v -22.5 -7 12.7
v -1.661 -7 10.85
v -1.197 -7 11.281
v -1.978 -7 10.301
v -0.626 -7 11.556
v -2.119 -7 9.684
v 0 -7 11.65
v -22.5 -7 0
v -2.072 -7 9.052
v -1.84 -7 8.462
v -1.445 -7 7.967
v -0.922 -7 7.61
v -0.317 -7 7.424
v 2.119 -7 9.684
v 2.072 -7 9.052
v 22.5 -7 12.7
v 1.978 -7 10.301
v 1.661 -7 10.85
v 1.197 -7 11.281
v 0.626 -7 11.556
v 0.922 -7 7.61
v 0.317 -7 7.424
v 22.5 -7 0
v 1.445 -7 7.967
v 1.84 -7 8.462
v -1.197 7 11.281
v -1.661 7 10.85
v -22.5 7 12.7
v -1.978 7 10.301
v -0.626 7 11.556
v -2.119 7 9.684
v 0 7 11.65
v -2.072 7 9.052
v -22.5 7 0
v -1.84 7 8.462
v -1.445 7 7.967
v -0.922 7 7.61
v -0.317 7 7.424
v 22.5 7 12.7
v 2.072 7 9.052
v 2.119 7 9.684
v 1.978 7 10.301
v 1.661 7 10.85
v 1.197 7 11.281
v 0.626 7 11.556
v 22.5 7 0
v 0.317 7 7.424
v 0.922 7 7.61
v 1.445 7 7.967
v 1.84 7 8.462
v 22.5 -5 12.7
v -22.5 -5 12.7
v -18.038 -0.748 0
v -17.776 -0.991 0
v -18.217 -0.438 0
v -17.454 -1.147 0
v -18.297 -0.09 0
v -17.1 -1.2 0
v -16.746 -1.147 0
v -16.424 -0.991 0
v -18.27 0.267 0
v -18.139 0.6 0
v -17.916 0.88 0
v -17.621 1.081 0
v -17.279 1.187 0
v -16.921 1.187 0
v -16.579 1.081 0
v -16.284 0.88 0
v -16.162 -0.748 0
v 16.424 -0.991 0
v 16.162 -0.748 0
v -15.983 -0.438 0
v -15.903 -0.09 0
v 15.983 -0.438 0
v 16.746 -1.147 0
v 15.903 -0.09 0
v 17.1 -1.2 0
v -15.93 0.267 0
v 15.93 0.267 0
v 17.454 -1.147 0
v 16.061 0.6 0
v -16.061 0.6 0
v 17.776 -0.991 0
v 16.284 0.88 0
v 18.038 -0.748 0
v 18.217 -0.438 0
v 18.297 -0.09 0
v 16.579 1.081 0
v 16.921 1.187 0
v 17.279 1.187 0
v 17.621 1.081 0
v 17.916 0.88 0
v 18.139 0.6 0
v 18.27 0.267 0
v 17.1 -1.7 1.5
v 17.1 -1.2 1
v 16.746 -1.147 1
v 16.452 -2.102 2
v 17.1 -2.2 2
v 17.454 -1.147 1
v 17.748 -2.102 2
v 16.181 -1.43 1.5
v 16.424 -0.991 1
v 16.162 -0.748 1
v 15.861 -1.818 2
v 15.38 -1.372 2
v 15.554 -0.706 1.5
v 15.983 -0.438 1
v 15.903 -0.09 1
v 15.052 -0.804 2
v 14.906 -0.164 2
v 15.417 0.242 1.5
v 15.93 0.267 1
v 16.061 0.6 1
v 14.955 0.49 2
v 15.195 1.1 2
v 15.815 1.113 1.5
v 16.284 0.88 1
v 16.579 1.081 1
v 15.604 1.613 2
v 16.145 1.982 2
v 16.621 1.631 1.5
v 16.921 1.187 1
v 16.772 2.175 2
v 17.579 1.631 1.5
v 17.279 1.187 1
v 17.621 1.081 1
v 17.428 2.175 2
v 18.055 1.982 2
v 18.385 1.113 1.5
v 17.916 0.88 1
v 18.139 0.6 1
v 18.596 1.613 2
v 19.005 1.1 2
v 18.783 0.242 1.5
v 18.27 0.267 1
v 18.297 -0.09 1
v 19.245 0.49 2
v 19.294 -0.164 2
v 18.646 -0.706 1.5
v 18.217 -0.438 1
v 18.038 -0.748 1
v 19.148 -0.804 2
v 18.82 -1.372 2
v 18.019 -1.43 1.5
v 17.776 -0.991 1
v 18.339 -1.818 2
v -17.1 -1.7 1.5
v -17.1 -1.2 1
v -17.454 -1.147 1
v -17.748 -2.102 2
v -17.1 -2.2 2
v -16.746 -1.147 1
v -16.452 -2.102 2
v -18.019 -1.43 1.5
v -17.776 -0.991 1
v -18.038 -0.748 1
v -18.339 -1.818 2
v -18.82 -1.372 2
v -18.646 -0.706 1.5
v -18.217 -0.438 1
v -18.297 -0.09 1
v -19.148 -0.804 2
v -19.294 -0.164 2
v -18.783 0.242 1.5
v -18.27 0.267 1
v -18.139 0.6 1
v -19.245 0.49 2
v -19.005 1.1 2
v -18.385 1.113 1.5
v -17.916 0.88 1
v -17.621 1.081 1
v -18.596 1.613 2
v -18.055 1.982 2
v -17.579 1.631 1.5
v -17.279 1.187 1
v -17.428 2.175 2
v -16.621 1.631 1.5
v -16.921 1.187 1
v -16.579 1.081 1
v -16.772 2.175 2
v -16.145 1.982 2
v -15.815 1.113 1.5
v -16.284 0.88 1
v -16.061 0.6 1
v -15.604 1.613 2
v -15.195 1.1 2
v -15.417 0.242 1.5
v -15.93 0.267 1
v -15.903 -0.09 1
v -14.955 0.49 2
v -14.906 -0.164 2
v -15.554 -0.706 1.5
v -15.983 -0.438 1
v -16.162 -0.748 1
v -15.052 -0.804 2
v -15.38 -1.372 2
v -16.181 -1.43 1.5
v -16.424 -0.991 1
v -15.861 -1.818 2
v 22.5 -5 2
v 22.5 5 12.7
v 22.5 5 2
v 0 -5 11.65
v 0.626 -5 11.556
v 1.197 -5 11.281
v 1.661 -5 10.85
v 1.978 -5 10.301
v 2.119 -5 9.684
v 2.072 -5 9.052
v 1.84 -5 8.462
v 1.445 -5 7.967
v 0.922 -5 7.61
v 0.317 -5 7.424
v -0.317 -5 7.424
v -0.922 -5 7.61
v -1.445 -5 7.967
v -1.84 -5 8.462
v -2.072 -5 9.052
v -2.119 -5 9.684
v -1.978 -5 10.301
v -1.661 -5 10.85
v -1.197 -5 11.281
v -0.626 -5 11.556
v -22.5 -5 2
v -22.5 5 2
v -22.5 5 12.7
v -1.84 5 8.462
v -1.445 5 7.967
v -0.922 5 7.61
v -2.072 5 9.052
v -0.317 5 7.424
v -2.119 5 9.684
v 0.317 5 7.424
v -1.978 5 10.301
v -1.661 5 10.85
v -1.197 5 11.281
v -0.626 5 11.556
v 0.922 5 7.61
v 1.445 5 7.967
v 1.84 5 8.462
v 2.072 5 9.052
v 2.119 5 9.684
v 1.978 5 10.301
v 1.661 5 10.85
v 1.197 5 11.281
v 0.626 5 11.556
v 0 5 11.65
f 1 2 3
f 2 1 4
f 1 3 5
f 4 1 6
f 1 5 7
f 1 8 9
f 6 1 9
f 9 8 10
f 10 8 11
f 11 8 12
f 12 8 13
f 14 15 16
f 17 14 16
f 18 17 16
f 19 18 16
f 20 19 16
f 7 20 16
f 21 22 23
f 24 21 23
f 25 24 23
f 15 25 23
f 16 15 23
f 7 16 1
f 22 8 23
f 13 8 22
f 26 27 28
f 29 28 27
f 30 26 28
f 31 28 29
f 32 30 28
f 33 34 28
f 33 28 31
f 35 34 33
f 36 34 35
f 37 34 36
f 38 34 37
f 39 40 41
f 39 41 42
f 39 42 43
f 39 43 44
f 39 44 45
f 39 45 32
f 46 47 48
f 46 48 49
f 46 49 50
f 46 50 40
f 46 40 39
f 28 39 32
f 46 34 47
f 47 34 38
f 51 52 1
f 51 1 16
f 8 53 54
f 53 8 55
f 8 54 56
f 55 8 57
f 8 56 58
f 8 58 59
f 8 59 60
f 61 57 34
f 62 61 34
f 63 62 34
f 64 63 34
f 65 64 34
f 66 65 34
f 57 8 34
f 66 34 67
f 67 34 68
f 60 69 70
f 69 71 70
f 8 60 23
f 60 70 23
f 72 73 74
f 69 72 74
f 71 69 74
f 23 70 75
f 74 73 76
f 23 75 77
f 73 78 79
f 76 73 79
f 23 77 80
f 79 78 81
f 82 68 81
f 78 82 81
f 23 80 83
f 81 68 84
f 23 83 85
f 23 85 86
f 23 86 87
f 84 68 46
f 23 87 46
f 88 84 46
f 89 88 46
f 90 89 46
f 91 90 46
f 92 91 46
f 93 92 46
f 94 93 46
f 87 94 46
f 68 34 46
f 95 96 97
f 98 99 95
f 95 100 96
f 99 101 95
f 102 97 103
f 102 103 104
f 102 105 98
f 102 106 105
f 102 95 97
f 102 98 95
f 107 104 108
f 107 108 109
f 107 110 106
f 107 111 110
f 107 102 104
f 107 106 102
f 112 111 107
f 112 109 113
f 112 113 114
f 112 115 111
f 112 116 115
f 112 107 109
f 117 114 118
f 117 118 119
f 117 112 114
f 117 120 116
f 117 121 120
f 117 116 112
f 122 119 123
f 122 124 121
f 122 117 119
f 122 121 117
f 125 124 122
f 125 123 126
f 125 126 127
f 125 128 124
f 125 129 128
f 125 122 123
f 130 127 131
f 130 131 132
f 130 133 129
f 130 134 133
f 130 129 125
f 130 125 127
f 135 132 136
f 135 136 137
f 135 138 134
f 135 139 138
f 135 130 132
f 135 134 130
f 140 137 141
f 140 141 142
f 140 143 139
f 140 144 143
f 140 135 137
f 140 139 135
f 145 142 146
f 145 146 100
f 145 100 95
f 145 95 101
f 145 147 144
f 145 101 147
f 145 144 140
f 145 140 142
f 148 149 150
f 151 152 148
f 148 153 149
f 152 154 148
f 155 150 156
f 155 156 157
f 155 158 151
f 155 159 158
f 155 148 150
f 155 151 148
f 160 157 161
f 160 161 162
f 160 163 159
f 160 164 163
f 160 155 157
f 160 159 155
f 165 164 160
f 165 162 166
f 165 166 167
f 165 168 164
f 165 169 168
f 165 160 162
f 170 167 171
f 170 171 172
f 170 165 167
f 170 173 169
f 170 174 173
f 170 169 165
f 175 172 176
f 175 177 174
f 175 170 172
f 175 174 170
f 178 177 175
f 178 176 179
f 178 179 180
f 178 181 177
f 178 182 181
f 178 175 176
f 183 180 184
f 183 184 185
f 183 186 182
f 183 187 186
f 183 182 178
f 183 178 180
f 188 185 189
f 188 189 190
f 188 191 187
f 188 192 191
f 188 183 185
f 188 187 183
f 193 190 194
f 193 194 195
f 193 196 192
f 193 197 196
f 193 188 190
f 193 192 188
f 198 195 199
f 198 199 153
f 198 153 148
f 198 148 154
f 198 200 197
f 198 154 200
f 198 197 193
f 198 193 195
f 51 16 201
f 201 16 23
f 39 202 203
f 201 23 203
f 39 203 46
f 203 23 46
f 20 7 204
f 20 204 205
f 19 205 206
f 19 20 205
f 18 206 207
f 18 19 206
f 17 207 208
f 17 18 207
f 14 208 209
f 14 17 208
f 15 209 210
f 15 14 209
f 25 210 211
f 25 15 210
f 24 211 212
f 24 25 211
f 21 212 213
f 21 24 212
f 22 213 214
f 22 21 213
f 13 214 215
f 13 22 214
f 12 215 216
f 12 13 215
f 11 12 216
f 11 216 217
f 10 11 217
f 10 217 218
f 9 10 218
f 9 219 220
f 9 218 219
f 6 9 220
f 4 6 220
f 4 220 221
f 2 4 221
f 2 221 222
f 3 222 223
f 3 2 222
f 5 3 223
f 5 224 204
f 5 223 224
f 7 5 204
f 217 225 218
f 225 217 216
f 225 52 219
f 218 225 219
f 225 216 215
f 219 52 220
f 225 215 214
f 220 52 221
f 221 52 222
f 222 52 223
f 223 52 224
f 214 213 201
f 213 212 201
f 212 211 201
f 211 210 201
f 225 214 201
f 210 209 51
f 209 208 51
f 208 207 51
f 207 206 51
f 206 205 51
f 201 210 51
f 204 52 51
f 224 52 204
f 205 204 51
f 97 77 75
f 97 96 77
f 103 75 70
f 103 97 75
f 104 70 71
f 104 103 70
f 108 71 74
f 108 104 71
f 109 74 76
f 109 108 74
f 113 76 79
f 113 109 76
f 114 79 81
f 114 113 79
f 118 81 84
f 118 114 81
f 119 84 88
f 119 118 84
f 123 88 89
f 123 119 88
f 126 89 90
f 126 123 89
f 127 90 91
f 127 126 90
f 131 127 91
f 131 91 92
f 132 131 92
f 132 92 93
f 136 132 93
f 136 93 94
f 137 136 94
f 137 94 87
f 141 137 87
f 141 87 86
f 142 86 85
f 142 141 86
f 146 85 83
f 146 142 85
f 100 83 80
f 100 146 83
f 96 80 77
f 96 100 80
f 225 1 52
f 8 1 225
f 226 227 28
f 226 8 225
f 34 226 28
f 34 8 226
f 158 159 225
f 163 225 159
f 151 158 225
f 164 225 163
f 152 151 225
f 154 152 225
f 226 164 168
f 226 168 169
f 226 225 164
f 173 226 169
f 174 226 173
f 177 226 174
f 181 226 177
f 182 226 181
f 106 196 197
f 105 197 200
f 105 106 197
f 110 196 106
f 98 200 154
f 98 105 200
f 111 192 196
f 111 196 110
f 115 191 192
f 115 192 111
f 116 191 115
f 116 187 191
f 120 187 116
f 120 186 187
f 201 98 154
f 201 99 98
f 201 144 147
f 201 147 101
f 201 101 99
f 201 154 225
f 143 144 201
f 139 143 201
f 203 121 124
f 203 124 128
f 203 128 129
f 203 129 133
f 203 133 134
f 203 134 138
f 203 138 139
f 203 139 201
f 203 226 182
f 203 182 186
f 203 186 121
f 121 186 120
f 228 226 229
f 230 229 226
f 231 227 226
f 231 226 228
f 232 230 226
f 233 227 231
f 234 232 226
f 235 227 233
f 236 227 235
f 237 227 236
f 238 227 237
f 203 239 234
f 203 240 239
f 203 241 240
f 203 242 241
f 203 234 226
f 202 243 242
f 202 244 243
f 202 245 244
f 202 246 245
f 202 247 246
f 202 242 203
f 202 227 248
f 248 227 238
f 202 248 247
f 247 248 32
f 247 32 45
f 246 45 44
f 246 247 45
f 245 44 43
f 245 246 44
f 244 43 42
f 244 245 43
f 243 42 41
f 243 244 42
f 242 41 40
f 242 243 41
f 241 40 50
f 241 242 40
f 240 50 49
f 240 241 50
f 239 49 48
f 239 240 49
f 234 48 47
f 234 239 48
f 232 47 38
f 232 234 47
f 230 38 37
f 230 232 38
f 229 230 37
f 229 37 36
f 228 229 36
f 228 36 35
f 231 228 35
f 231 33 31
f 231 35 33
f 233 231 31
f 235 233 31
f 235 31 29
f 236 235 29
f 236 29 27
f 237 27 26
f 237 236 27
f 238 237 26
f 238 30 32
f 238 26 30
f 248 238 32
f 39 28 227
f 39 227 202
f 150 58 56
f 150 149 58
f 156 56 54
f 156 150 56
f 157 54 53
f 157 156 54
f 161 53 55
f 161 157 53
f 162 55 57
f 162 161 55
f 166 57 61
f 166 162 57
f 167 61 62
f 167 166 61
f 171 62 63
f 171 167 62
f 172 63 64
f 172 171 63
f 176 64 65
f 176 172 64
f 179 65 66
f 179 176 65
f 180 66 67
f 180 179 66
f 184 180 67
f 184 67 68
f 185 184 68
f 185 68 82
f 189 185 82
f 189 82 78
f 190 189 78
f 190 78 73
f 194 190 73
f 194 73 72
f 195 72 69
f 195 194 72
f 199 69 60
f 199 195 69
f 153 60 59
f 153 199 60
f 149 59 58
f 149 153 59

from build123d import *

# Parameters (mm, degrees)
SKETCH1_W                                      = 45
SKETCH1_H                                      = 14
BOSS_EXTRUDE1_DEPTH                            = 12.7
SKETCH2_W                                      = 45
SKETCH2_H                                      = 10
CUT_EXTRUDE1_DEPTH                             = 10.7
CSK_FOR_M2_FLAT_HEAD_MACHINE_SCREW1_AT_2_COUNT = 2
CSK_FOR_M2_FLAT_HEAD_MACHINE_SCREW1_AT_2_PITCH = 34.2
CUT_EXTRUDE2_DEPTH                             = 30.386051113
CUT_EXTRUDE2_DEPTH_BACK                        = 30.386051113
SKETCH5_R                                      = 2.125


with BuildPart() as part:
    # Sketch1 → Boss-Extrude1 (new body)
    with BuildSketch(Plane.XY):
        Rectangle(SKETCH1_W, SKETCH1_H)
    extrude(amount=BOSS_EXTRUDE1_DEPTH)

    # Sketch2 → Cut-Extrude1 (cut)
    with BuildSketch(Plane.XY.offset(12.7)):
        Rectangle(SKETCH2_W, SKETCH2_H)
    extrude(amount=-CUT_EXTRUDE1_DEPTH, mode=Mode.SUBTRACT)

    # Sketch3 → CSK for M2 Flat Head Machine Screw1 (revolve, cut)
    with BuildSketch(Plane(origin=(-17.1, 0, 2), x_dir=(0, -1, 0), z_dir=(1, 0, 0))):
        Polygon((0, 0), (0, 2), (1.2, 2), (1.2, 1), (2.2, 0), align=None)
    csk_for_m2_flat_head_machine_screw1 = revolve(axis=Axis((-17.1, 0, 8.35), (0, 0, -1)), mode=Mode.SUBTRACT)

    # CSK for M2 Flat Head Machine Screw1 at 2: CSK for M2 Flat Head Machine Screw1 ×2
    with Locations(*[(i * CSK_FOR_M2_FLAT_HEAD_MACHINE_SCREW1_AT_2_PITCH, 0, 0) for i in range(1, CSK_FOR_M2_FLAT_HEAD_MACHINE_SCREW1_AT_2_COUNT)]):
        add(csk_for_m2_flat_head_machine_screw1, mode=Mode.SUBTRACT)

    # Sketch5 → Cut-Extrude2 (cut, two sides: drawn at the far end of the back side and taken through both)
    with BuildSketch(Plane(origin=(0, 7, 0), x_dir=(1, 0, 0), z_dir=(0, 1, 0)).offset(-CUT_EXTRUDE2_DEPTH_BACK)):
        with Locations((0, -9.525)):
            Circle(SKETCH5_R)
    extrude(amount=CUT_EXTRUDE2_DEPTH + CUT_EXTRUDE2_DEPTH_BACK, mode=Mode.SUBTRACT)


solid = part.part
